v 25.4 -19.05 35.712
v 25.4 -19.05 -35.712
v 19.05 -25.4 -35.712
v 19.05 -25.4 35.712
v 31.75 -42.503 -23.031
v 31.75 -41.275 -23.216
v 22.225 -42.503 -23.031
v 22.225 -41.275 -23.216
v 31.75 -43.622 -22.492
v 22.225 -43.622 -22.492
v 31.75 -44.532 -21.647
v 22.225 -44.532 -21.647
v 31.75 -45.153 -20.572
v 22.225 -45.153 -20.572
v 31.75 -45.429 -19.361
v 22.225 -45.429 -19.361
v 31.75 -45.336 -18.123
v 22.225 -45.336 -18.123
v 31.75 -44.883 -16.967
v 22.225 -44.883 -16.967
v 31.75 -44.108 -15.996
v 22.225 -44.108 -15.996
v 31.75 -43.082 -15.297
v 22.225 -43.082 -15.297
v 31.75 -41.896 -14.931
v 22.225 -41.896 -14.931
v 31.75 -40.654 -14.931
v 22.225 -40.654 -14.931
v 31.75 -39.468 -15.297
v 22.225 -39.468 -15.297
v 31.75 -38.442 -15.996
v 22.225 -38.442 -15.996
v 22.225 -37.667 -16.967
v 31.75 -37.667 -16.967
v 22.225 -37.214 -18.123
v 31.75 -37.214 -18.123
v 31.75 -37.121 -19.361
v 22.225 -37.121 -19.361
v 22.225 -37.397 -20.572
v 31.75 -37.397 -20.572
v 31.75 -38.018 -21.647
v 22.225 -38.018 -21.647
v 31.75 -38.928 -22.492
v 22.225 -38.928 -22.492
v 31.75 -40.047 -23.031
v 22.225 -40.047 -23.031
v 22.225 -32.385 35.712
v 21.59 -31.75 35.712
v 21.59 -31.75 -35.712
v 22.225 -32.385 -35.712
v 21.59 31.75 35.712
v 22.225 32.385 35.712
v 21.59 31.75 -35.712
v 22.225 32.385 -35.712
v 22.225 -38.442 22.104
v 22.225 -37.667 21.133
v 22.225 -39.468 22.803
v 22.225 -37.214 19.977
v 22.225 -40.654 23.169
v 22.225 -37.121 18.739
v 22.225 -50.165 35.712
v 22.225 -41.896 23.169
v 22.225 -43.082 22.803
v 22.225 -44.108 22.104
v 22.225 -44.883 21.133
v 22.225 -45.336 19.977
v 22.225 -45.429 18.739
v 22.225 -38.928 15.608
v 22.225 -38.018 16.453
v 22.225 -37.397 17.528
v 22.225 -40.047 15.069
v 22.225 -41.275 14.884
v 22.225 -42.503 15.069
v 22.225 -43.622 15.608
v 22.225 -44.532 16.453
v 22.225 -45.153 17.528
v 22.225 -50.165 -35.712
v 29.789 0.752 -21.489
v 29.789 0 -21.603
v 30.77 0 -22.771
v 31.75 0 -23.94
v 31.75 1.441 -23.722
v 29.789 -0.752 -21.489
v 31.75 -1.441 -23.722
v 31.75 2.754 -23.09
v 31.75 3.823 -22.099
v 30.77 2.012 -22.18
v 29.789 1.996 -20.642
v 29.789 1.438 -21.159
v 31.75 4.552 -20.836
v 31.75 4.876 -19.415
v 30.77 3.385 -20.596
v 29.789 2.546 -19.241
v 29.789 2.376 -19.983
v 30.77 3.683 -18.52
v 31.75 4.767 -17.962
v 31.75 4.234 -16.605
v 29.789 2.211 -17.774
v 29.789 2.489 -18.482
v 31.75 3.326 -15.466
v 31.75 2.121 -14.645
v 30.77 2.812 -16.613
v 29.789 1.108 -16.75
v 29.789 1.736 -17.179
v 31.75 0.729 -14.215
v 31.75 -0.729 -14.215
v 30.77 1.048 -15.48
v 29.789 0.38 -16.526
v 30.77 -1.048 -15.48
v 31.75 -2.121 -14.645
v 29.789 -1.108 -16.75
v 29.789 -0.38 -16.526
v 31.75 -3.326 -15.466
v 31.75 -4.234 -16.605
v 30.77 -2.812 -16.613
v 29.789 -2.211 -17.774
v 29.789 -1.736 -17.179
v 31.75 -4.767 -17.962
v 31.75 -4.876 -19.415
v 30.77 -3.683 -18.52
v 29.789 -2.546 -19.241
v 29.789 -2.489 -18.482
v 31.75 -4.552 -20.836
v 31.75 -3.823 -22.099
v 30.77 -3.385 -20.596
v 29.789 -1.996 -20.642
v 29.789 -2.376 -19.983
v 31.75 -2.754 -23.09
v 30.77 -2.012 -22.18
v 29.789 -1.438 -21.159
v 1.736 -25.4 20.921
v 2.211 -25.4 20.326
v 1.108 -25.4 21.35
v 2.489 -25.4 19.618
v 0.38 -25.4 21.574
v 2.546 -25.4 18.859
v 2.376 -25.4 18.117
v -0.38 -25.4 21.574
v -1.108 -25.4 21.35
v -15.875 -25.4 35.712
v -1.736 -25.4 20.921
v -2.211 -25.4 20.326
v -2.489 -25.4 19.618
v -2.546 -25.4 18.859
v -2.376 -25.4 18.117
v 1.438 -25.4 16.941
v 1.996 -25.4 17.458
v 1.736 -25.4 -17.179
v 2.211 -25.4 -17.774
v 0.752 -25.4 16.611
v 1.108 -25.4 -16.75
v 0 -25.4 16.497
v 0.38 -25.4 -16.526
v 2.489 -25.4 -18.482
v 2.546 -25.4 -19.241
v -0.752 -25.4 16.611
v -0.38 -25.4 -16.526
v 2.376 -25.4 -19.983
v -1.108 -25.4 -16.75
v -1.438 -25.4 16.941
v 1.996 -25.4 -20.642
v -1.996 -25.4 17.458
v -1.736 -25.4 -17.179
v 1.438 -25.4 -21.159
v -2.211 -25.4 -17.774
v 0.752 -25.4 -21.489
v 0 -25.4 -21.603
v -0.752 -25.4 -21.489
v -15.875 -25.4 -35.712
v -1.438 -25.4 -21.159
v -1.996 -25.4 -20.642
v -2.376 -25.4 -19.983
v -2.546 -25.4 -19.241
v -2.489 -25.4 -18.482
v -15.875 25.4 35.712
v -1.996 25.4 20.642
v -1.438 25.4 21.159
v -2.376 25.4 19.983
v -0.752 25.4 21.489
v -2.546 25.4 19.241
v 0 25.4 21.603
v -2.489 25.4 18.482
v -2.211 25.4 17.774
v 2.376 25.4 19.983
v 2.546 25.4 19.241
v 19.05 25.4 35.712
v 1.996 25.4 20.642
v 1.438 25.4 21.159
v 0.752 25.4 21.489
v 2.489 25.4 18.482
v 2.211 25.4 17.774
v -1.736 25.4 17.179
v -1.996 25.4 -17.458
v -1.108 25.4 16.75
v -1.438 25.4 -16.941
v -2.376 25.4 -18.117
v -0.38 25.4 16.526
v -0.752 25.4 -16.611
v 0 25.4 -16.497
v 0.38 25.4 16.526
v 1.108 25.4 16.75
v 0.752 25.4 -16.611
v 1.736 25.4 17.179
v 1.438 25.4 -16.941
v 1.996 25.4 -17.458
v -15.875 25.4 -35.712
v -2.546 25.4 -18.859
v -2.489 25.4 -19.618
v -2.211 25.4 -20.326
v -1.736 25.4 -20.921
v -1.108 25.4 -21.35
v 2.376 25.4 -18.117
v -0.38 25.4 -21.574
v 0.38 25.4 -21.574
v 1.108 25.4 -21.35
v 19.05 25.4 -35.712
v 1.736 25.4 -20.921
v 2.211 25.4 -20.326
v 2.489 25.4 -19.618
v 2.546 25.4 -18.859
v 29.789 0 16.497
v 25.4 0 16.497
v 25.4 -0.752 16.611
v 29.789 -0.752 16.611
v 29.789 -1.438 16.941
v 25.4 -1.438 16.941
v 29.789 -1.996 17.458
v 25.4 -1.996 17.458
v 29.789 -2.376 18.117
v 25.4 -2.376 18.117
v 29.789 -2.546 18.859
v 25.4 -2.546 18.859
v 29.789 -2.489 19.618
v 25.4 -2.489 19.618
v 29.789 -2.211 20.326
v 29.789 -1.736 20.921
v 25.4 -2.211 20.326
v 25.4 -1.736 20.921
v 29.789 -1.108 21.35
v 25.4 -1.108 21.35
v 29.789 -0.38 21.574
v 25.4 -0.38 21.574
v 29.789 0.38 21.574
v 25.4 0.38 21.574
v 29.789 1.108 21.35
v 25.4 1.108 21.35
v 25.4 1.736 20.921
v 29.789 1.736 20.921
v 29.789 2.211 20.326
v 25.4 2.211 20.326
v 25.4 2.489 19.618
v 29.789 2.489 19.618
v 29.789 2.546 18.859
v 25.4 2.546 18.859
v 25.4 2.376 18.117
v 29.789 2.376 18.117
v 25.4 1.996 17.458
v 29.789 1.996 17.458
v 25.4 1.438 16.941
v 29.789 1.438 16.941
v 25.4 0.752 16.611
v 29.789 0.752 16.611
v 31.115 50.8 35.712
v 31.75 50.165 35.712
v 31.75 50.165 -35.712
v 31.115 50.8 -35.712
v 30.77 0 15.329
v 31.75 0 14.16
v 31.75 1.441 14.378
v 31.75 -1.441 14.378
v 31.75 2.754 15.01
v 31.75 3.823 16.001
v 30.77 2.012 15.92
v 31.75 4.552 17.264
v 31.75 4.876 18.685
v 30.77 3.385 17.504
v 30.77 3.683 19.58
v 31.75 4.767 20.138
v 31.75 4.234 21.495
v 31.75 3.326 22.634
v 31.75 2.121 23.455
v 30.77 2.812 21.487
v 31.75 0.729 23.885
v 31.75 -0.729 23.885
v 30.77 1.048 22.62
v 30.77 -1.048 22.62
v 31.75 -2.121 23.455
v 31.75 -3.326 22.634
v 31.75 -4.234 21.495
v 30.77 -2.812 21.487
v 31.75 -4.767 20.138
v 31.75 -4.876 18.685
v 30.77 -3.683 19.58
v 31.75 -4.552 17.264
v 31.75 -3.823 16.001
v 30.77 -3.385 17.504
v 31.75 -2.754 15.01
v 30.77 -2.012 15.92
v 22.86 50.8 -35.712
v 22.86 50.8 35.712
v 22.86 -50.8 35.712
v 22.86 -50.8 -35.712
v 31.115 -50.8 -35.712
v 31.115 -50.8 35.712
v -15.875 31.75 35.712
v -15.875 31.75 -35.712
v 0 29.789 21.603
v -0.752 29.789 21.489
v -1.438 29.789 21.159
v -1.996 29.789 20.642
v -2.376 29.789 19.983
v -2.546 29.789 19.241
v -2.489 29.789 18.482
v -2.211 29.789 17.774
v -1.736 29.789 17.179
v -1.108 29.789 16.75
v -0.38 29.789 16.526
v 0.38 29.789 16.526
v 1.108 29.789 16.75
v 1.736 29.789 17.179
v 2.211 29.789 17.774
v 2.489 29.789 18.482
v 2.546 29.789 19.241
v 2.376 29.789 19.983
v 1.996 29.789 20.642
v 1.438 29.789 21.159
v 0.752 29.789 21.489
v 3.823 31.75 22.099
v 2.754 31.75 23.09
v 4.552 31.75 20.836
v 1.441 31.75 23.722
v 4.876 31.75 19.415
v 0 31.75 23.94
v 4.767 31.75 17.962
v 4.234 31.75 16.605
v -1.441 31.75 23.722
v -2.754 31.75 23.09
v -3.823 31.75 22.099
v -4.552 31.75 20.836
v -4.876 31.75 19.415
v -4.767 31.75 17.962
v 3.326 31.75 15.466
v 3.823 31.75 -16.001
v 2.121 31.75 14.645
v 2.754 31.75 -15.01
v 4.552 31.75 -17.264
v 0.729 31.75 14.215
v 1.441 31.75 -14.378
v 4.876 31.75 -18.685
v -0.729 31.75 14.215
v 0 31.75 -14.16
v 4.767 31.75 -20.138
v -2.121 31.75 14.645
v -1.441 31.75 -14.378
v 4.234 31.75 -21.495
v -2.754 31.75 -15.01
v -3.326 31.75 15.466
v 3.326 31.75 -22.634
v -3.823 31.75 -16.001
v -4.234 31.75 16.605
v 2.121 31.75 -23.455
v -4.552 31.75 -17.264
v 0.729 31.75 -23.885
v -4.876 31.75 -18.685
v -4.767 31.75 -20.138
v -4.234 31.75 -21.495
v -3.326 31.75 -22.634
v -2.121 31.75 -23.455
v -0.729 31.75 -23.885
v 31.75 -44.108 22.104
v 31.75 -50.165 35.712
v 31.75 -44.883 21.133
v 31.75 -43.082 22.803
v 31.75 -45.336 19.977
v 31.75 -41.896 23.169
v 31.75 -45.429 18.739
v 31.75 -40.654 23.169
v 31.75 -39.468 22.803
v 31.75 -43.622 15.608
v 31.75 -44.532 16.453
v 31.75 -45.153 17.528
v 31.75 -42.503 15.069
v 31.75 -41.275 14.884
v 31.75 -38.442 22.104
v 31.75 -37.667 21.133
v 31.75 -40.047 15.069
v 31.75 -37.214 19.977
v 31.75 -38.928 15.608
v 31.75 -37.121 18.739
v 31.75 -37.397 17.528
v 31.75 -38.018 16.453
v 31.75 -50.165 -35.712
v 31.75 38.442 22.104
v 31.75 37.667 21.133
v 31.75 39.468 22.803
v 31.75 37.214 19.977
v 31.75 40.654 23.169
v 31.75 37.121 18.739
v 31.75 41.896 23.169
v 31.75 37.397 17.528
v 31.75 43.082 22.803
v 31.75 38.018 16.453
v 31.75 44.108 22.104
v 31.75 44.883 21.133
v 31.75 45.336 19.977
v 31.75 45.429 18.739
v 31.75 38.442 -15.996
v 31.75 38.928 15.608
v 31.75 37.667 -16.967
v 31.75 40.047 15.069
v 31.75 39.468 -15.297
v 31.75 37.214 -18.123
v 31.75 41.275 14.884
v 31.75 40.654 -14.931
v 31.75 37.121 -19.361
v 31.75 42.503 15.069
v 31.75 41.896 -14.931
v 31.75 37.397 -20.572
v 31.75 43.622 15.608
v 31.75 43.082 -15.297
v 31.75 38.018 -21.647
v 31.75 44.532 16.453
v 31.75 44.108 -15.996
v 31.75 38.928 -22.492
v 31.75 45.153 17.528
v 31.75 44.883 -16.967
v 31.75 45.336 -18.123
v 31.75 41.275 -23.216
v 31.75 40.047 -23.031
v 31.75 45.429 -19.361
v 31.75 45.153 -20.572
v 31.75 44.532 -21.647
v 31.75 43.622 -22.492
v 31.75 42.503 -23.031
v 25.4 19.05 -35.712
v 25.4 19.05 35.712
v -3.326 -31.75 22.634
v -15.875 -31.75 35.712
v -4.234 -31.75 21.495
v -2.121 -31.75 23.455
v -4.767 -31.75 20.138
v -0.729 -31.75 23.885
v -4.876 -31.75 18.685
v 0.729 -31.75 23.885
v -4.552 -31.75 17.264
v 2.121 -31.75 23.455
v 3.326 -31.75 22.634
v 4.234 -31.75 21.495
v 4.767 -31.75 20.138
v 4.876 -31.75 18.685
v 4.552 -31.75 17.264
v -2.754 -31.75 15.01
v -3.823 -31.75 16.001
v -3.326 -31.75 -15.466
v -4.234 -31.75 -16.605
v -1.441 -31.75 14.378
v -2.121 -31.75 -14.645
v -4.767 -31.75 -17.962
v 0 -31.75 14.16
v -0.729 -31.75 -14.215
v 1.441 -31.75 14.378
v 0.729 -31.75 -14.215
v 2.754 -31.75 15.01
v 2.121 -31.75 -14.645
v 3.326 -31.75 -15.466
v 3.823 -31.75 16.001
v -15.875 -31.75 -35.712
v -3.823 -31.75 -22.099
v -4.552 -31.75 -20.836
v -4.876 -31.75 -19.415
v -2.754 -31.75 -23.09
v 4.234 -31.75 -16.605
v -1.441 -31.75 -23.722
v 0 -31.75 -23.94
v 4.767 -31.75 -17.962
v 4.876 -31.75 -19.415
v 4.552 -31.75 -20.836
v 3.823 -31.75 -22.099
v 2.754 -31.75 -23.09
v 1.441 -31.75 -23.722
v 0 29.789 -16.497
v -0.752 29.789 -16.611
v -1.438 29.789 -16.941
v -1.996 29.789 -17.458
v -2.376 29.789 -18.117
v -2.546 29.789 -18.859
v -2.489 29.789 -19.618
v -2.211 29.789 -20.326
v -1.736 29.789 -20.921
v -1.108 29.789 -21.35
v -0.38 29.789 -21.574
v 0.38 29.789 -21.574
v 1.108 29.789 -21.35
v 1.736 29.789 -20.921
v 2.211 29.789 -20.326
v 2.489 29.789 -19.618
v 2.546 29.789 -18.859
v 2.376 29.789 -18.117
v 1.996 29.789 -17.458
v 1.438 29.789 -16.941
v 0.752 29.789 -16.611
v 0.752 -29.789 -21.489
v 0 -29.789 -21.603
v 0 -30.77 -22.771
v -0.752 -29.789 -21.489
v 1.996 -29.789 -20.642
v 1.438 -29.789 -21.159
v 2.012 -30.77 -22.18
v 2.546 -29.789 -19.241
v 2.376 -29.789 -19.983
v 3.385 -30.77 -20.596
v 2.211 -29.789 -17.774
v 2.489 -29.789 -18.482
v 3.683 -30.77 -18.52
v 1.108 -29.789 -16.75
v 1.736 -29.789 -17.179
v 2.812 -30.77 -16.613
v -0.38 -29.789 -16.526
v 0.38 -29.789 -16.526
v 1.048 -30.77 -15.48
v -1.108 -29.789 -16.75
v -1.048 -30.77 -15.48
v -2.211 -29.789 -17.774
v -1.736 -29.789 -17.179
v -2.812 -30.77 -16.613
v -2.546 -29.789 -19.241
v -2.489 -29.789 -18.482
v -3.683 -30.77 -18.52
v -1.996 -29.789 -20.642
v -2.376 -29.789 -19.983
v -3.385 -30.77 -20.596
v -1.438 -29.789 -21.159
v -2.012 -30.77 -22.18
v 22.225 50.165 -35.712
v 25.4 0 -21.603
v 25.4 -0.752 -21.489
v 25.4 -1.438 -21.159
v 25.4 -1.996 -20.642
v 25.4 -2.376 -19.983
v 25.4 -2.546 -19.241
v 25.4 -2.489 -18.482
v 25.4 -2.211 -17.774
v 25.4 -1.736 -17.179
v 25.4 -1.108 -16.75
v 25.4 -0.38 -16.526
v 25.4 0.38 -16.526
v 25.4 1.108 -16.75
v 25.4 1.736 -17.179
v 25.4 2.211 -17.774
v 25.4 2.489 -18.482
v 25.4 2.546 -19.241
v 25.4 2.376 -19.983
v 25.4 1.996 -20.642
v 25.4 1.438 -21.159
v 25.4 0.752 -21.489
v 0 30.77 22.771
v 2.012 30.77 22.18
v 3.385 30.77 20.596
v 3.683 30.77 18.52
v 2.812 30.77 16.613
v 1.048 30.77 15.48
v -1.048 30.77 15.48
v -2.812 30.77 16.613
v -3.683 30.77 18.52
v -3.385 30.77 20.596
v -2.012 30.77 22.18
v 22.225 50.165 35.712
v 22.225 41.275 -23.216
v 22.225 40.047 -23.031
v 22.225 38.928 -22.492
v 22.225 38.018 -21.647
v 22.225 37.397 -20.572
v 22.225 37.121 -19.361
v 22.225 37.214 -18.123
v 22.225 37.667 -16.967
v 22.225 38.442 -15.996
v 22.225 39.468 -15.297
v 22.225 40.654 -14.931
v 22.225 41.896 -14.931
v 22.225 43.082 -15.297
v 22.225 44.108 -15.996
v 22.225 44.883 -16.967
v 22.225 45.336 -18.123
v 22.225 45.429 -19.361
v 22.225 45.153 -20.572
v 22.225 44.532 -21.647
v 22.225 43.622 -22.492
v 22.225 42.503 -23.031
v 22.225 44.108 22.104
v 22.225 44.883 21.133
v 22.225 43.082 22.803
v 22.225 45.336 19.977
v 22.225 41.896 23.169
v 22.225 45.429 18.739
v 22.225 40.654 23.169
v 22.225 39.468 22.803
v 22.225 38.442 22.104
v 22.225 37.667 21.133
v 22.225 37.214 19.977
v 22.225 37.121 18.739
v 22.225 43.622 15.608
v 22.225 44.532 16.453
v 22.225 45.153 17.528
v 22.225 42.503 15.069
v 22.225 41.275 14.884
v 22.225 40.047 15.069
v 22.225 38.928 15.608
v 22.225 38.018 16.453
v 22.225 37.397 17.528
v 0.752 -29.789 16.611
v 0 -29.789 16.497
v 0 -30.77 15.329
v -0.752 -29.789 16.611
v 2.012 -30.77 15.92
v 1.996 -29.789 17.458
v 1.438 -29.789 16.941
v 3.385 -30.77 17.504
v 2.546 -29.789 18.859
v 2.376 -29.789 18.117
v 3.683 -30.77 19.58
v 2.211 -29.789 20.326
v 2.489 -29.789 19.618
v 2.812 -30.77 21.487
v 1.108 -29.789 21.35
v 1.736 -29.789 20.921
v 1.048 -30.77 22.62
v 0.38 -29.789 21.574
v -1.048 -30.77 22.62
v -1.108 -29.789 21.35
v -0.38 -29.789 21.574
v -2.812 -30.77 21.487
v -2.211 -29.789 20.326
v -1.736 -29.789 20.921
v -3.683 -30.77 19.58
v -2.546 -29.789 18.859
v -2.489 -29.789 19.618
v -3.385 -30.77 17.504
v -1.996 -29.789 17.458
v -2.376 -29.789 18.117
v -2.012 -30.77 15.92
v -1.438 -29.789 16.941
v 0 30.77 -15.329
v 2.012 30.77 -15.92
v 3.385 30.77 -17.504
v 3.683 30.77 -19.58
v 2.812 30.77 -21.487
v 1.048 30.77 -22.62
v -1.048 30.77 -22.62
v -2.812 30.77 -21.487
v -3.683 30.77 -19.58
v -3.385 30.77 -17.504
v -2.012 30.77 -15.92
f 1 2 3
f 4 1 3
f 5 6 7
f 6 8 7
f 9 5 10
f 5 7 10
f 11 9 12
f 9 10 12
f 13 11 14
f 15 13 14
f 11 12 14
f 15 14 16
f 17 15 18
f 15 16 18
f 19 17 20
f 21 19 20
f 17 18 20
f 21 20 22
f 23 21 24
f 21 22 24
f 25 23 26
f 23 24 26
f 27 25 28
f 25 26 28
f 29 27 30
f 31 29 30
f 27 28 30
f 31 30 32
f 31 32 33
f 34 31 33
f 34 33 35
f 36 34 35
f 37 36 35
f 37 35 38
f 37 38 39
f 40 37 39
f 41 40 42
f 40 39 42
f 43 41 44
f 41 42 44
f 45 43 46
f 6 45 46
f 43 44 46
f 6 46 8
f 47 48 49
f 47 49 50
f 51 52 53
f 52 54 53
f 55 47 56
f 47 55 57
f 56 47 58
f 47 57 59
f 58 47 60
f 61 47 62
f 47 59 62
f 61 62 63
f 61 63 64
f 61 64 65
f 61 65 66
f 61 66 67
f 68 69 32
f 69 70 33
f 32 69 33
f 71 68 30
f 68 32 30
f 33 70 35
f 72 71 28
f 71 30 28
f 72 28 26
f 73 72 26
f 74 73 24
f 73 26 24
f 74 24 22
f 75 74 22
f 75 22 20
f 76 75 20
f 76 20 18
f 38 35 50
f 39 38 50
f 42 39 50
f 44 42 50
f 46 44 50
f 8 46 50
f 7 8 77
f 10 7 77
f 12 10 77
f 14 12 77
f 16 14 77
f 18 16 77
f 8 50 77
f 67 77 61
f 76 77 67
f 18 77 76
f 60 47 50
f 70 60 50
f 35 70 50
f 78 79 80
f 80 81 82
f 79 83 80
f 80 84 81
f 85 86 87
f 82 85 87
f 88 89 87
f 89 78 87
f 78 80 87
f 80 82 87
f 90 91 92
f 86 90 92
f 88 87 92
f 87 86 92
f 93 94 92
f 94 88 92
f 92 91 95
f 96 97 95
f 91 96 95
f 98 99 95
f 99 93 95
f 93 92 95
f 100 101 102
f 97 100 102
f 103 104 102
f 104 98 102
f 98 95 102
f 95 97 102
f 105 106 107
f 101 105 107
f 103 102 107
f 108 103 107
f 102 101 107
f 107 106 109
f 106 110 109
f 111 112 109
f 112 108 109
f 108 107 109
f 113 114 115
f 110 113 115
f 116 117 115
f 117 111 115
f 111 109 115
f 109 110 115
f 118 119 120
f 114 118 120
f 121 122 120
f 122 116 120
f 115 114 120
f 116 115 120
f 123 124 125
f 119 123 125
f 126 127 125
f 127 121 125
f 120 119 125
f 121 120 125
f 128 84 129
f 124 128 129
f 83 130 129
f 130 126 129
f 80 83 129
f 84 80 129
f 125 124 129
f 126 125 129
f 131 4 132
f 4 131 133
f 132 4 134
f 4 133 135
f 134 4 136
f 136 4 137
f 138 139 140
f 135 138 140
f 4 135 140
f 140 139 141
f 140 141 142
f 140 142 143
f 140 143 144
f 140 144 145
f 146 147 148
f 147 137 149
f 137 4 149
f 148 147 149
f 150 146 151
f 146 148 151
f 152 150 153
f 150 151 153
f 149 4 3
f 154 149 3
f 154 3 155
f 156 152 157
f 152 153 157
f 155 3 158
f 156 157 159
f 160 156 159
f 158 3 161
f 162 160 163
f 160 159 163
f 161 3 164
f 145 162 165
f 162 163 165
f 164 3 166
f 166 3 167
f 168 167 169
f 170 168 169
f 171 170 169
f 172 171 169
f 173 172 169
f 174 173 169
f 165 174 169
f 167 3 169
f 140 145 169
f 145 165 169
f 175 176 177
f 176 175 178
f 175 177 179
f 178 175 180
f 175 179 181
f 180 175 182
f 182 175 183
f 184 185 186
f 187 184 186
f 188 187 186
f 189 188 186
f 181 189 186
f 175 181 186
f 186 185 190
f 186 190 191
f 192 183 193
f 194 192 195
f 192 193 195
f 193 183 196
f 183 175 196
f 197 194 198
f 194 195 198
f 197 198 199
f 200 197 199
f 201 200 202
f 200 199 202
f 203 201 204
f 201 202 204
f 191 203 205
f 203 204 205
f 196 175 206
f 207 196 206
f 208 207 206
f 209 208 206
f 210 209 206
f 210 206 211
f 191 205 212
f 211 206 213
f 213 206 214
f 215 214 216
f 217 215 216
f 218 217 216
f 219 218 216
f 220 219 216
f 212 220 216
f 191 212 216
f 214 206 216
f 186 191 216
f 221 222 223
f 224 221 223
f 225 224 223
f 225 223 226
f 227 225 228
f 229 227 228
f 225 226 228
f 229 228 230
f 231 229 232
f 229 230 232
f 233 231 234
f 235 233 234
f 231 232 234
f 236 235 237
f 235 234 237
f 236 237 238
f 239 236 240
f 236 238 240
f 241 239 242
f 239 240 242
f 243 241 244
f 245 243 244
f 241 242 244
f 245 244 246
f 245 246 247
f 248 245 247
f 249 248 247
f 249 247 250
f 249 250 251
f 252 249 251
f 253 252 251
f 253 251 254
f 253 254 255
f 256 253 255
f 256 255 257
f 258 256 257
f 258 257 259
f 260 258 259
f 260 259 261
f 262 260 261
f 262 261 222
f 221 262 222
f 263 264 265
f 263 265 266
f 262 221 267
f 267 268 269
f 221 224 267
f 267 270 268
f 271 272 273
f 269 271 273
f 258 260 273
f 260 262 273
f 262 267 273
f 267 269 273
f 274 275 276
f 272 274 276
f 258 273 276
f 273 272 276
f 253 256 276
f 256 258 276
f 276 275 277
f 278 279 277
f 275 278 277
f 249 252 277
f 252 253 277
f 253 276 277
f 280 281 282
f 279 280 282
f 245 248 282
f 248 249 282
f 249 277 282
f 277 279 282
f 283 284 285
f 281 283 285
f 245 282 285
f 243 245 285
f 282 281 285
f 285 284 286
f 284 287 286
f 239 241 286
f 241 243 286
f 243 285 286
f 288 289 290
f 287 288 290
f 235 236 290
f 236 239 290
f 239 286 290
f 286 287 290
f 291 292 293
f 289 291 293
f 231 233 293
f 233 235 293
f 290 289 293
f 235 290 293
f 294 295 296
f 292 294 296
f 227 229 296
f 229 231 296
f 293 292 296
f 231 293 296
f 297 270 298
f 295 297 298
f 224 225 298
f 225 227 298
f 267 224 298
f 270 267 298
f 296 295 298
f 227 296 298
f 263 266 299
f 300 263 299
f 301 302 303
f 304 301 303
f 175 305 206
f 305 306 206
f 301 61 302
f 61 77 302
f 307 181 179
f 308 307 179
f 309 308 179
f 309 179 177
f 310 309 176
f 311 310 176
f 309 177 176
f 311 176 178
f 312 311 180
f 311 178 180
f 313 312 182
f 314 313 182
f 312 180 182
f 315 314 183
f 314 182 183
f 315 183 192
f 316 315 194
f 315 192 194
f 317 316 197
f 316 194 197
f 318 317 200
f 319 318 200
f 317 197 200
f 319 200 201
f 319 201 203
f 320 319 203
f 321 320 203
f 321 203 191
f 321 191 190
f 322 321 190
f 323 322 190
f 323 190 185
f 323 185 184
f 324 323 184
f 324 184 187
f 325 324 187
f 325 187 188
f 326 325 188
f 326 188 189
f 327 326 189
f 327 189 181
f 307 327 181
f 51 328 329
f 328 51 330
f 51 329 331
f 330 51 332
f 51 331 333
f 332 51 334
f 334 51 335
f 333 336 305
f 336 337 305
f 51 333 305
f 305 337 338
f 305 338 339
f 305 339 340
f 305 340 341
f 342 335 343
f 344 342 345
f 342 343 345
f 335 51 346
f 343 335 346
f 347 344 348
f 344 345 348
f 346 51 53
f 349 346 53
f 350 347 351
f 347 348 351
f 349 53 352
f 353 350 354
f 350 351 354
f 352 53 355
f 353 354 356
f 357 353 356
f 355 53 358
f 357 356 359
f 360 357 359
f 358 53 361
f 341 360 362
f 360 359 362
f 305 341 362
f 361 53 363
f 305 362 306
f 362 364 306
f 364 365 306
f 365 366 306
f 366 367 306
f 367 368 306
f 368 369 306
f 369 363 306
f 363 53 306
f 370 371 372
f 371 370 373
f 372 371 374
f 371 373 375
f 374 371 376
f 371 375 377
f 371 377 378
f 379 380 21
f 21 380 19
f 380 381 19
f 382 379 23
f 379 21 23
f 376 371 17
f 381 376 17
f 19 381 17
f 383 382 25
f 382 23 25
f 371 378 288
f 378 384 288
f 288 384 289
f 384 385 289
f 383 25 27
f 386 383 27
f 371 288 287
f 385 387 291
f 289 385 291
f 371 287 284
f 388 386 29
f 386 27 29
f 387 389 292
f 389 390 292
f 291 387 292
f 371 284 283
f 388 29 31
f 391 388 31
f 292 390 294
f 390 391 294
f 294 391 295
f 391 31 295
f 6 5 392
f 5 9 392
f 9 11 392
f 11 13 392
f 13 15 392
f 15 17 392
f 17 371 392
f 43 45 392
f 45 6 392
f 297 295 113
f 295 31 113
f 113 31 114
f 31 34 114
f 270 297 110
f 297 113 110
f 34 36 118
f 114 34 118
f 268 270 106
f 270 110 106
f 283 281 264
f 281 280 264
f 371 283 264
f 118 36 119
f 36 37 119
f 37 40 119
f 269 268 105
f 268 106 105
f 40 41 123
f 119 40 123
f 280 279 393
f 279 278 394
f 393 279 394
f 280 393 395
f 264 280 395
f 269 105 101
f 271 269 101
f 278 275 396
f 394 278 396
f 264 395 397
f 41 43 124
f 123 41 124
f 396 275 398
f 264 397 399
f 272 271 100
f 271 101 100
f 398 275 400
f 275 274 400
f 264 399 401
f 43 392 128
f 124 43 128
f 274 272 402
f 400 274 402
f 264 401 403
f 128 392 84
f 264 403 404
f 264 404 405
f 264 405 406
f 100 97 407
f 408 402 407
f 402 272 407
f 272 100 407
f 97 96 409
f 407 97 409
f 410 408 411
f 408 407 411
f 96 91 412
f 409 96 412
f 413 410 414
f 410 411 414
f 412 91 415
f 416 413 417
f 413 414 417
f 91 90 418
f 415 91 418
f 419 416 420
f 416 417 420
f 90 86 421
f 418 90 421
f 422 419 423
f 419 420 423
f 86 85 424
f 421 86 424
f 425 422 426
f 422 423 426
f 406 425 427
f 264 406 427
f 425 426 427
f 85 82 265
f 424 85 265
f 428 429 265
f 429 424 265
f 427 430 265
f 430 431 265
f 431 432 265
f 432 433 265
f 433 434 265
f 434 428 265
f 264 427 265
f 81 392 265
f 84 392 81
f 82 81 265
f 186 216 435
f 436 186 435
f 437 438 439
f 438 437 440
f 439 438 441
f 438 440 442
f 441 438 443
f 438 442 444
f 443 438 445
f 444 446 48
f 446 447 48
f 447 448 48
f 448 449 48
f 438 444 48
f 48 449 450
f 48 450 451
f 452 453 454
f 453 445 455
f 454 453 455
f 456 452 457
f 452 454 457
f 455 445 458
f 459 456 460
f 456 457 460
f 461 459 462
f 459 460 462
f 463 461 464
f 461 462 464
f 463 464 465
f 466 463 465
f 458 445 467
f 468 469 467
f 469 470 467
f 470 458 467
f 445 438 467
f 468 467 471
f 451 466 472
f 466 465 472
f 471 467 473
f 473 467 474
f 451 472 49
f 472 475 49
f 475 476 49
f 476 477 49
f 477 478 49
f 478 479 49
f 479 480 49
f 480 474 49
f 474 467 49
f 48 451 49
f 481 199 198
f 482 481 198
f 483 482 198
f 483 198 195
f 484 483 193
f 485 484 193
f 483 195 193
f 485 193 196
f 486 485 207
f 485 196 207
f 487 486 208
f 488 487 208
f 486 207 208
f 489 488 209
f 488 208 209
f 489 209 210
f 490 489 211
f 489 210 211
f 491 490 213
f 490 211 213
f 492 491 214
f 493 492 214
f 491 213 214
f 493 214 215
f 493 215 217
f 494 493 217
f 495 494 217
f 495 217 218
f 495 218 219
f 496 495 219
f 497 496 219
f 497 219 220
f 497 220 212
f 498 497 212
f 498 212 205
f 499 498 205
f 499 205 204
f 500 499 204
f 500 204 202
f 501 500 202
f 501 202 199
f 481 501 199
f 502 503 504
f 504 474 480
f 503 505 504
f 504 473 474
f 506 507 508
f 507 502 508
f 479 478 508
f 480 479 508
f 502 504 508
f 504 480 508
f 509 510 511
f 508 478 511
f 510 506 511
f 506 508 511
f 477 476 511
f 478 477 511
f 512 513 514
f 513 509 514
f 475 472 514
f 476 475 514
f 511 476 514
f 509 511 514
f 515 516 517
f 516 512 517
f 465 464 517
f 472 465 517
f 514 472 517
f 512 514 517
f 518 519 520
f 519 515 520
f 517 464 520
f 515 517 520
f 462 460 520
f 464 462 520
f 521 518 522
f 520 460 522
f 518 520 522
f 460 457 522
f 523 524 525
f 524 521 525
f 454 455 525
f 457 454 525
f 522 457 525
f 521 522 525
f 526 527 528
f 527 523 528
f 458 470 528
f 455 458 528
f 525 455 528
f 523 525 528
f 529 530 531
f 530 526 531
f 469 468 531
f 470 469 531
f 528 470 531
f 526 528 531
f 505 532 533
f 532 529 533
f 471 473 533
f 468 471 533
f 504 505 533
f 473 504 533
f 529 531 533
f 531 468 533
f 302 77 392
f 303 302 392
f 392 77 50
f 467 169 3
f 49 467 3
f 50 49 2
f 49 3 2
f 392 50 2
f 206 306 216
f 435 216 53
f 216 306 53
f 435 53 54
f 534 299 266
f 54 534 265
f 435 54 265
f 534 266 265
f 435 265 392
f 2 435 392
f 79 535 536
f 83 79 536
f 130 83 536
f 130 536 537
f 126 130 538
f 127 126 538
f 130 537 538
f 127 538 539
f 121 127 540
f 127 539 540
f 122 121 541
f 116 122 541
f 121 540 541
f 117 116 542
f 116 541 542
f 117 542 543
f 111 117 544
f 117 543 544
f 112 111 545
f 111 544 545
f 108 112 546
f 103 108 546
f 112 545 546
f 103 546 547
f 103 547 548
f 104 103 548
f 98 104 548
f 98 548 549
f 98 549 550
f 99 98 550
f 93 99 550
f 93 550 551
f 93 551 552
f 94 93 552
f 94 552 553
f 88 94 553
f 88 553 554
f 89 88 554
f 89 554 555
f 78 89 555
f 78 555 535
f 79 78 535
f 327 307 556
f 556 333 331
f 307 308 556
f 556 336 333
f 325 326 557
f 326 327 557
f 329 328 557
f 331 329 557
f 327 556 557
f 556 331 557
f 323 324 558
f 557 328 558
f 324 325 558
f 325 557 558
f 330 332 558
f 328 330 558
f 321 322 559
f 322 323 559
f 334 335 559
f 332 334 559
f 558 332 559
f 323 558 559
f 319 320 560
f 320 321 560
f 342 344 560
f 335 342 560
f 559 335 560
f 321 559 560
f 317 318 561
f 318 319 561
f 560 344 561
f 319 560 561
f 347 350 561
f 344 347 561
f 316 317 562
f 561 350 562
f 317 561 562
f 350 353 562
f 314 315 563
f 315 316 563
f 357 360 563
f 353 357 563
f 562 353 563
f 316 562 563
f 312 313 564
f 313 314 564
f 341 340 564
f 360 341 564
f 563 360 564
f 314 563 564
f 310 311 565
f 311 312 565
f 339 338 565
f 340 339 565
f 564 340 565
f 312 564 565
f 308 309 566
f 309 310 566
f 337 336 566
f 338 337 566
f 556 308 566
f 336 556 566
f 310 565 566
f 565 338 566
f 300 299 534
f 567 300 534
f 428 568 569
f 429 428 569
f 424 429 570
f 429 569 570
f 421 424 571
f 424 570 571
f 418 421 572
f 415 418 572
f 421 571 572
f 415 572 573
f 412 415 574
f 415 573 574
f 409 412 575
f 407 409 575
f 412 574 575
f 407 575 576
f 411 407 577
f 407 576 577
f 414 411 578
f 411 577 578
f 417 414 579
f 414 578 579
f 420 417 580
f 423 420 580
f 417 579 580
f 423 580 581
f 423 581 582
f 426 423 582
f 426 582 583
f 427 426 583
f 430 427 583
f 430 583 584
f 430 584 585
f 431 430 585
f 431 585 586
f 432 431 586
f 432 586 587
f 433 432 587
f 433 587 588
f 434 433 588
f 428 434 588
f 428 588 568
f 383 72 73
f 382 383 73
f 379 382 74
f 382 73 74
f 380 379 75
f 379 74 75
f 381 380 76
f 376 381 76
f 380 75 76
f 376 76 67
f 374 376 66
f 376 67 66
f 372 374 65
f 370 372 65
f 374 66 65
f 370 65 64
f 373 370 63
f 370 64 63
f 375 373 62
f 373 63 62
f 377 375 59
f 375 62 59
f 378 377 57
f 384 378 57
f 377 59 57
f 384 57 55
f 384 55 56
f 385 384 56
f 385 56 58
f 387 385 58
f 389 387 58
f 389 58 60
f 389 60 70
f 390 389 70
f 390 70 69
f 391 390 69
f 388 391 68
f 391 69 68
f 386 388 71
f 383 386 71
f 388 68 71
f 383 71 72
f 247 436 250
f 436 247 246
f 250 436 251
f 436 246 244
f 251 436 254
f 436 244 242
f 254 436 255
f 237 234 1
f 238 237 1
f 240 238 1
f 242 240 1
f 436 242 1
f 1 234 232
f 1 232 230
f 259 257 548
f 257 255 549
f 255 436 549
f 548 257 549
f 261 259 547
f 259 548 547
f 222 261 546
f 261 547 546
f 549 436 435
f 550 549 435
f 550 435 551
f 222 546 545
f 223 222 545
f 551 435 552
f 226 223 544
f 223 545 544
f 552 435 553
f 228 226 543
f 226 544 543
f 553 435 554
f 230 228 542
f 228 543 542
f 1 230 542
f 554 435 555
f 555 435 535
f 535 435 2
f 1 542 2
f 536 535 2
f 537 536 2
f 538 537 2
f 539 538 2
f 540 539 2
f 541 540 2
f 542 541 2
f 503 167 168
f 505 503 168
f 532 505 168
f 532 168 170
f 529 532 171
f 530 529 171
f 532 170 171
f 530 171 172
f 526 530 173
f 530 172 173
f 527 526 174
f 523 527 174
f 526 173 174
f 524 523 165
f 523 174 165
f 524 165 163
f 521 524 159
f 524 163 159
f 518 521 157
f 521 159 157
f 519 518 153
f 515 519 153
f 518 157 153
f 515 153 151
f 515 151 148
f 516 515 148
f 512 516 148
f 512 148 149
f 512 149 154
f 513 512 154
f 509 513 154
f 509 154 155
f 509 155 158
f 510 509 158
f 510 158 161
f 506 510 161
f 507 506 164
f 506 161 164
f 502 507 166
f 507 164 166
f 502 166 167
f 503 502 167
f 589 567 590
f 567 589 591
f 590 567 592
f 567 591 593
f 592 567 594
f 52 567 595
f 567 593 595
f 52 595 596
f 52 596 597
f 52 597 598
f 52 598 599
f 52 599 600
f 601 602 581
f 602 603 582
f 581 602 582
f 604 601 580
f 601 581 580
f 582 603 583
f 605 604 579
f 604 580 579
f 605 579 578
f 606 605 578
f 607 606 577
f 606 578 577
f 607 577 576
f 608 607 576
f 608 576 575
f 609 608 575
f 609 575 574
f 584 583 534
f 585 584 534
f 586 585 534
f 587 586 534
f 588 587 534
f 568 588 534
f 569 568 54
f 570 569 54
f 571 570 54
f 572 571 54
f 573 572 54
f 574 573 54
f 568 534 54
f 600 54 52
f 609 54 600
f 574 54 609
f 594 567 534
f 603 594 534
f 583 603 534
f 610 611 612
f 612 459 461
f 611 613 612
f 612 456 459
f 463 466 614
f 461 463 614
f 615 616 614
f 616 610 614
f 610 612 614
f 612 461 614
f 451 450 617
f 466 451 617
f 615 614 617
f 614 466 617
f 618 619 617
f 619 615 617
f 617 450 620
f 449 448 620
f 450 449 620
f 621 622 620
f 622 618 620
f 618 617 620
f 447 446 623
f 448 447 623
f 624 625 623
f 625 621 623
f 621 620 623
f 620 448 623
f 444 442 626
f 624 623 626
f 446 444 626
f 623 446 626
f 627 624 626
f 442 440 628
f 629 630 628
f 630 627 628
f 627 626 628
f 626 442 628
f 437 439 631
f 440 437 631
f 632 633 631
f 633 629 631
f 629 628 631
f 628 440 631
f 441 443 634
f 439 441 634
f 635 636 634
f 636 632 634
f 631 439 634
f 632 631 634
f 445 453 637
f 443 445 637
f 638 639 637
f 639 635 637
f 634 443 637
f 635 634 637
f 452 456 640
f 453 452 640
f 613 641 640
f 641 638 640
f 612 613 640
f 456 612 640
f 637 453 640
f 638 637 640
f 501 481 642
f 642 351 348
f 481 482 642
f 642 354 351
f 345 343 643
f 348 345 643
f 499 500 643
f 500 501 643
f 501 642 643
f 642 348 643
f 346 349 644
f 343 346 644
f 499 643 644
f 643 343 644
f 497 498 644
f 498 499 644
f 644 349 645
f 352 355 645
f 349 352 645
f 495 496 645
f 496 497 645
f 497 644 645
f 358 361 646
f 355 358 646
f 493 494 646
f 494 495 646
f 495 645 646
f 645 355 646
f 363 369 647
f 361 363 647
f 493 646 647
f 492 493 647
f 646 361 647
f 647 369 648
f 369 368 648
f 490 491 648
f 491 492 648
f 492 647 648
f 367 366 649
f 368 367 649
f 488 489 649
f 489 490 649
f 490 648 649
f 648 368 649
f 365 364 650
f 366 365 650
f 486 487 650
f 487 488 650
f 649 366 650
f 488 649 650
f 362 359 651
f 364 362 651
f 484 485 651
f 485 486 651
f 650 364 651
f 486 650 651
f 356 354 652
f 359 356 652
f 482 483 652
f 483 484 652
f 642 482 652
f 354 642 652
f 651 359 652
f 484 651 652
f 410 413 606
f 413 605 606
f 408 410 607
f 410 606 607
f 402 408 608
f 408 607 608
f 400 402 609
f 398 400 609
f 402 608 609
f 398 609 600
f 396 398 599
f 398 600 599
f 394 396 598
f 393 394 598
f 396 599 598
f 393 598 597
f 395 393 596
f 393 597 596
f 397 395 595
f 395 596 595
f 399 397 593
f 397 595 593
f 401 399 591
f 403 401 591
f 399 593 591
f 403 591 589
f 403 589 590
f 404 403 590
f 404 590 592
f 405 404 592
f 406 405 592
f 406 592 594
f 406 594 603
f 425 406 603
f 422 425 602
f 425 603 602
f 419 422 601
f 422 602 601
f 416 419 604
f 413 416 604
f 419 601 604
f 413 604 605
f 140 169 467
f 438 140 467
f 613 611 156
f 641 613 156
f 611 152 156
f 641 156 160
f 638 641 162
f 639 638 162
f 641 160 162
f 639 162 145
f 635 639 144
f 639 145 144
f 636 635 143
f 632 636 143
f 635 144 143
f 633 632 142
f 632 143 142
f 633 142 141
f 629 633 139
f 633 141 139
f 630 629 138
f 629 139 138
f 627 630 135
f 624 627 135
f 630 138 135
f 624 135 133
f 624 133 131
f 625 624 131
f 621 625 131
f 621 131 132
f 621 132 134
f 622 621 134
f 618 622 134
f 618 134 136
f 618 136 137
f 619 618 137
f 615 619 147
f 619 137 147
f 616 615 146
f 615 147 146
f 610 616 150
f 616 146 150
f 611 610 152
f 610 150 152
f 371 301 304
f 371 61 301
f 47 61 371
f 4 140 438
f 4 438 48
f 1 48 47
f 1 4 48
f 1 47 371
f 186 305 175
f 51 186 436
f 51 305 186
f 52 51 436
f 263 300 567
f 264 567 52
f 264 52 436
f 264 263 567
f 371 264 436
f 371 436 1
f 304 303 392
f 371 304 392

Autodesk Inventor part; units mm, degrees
sketch "Sketch_1" plane through (0, 0, 0) normal (0, 0, 1) x (1, 0, 0)
  line L0 (-15.875, -25.4) -> (-15.875, -31.75)
  line L1 (-15.875, -31.75) -> (21.59, -31.75)
  line L2 (21.59, -31.75) -> (22.225, -32.385)
  line L3 (22.225, -32.385) -> (22.225, -50.165)
  line L4 (22.225, -50.165) -> (22.86, -50.8)
  line L5 (22.86, -50.8) -> (31.115, -50.8)
  line L6 (31.115, -50.8) -> (31.75, -50.165)
  line L7 (31.75, -50.165) -> (31.75, 50.165)
  line L8 (31.75, 50.165) -> (31.115, 50.8)
  line L9 (31.115, 50.8) -> (22.86, 50.8)
  line L10 (22.86, 50.8) -> (22.225, 50.165)
  line L11 (22.225, 50.165) -> (22.225, 32.385)
  line L12 (22.225, 32.385) -> (21.59, 31.75)
  line L13 (21.59, 31.75) -> (-15.875, 31.75)
  line L14 (-15.875, 31.75) -> (-15.875, 25.4)
  line L15 (-15.875, 25.4) -> (19.05, 25.4)
  line L16 (19.05, 25.4) -> (25.4, 19.05)
  line L17 (25.4, 19.05) -> (25.4, -19.05)
  line L18 (25.4, -19.05) -> (19.05, -25.4)
  line L19 (19.05, -25.4) -> (-15.875, -25.4)
extrude "Extrusion1" add sketch "Sketch_1" along normal mid plane 71.4248
sketch "Sketch2" plane through (31.75, -50.165, 35.7124) normal (1, 0, 0) x (0, 0, -1)
  point P0 (16.6624, 91.44)
hole "Hole1" at (31.75, 41.275, 19.05) direction (-1, 0, 0) diameter 8.3312 depth 9.525
pattern_linear "Rectangular Pattern1" count 2 spacing 38.1 along (0, 0, -1) count 2 spacing 82.55 along (0, -1, 0) of "Hole1"
sketch "Sketch3" plane through (31.75, -50.165, 35.7124) normal (1, 0, 0) x (0, 0, -1)
  point P0 (16.6624, 50.165)
hole "Hole2" at (31.75, 0, 19.05) direction (-1, 0, 0) diameter 5.1054 depth 6.35 countersink diameter 9.779 countersink angle 100
pattern_linear "Rectangular Pattern2" count 2 spacing 38.1 along (0, 0, -1) of "Hole2"
sketch "Sketch4" plane through (-15.875, 31.75, 35.7124) normal (0, 1, 0) x (1, 0, 0)
  point P0 (15.875, 16.6624)
hole "Hole3" at (0, 31.75, 19.05) direction (0, -1, 0) diameter 5.1054 depth 6.35 countersink diameter 9.779 countersink angle 100
pattern_linear "Rectangular Pattern3" count 2 spacing 38.1 along (0, 0, -1) of "Hole3"
sketch "Sketch5" plane through (-15.875, -31.75, 35.7124) normal (0, -1, 0) x (1, 0, 0)
  point P0 (15.875, -16.6624)
hole "Hole4" at (0, -31.75, 19.05) direction (0, 1, 0) diameter 5.1054 depth 6.35 countersink diameter 9.779 countersink angle 100
pattern_linear "Rectangular Pattern4" count 2 spacing 38.1 along (0, 0, -1) of "Hole4"
ref_plane "s1_XY" through (25.4, 0, 19.05) normal (1, 0, 0) x (0, 0, -1)
ref_plane "s1_YZ" through (25.4, 0, 19.05) normal (0, 0, -1) x (0, 1, 0)
ref_plane "s1_ZX" through (25.4, 0, 19.05) normal (0, 1, 0) x (1, 0, 0)
ref_plane "s1_2_XY" through (25.4, 0, -19.05) normal (1, 0, 0) x (0, 0, -1)
ref_plane "s1_2_YZ" through (25.4, 0, -19.05) normal (0, 0, -1) x (0, 1, 0)
ref_plane "s1_2_ZX" through (25.4, 0, -19.05) normal (0, 1, 0) x (1, 0, 0)
ref_plane "s2_XY" through (0, 25.4, 19.05) normal (0, 1, 0) x (1, 0, 0)
ref_plane "s2_YZ" through (0, 25.4, 19.05) normal (1, 0, 0) x (0, 0, -1)
ref_plane "s2_ZX" through (0, 25.4, 19.05) normal (0, 0, -1) x (0, 1, 0)
ref_plane "s2_2_XY" through (0, 25.4, -19.05) normal (0, 1, 0) x (1, 0, 0)
ref_plane "s2_2_YZ" through (0, 25.4, -19.05) normal (1, 0, 0) x (0, 0, -1)
ref_plane "s2_2_ZX" through (0, 25.4, -19.05) normal (0, 0, -1) x (0, 1, 0)
ref_plane "s3_XY" through (0, -25.4, 19.05) normal (0, 1, 0) x (1, 0, 0)
ref_plane "s3_YZ" through (0, -25.4, 19.05) normal (1, 0, 0) x (0, 0, -1)
ref_plane "s3_ZX" through (0, -25.4, 19.05) normal (0, 0, -1) x (0, 1, 0)
ref_plane "s3_2_XY" through (0, -25.4, -19.05) normal (0, 1, 0) x (1, 0, 0)
ref_plane "s3_2_YZ" through (0, -25.4, -19.05) normal (1, 0, 0) x (0, 0, -1)
ref_plane "s3_2_ZX" through (0, -25.4, -19.05) normal (0, 0, -1) x (0, 1, 0)
ref_plane "t1_1_XY" through (29.7892, 0, 19.05) normal (1, 0, 0) x (0, 0, -1)
ref_plane "t1_1_YZ" through (29.7892, 0, 19.05) normal (0, 0, -1) x (0, 1, 0)
ref_plane "t1_1_ZX" through (29.7892, 0, 19.05) normal (0, 1, 0) x (1, 0, 0)
ref_plane "t1_2_XY" through (29.7892, 0, -19.05) normal (1, 0, 0) x (0, 0, -1)
ref_plane "t1_2_YZ" through (29.7892, 0, -19.05) normal (0, 0, -1) x (0, 1, 0)
ref_plane "t1_2_ZX" through (29.7892, 0, -19.05) normal (0, 1, 0) x (1, 0, 0)
ref_plane "t2_1_XY" through (0, 29.7892, 19.05) normal (0, 1, 0) x (1, 0, 0)
ref_plane "t2_1_YZ" through (0, 29.7892, 19.05) normal (1, 0, 0) x (0, 0, -1)
ref_plane "t2_1_ZX" through (0, 29.7892, 19.05) normal (0, 0, -1) x (0, 1, 0)
ref_plane "t2_2_XY" through (0, 29.7892, -19.05) normal (0, 1, 0) x (1, 0, 0)
ref_plane "t2_2_YZ" through (0, 29.7892, -19.05) normal (1, 0, 0) x (0, 0, -1)
ref_plane "t2_2_ZX" through (0, 29.7892, -19.05) normal (0, 0, -1) x (0, 1, 0)
ref_plane "t3_1_XY" through (0, -29.7892, 19.05) normal (0, 1, 0) x (1, 0, 0)
ref_plane "t3_1_YZ" through (0, -29.7892, 19.05) normal (1, 0, 0) x (0, 0, -1)
ref_plane "t3_1_ZX" through (0, -29.7892, 19.05) normal (0, 0, -1) x (0, 1, 0)
ref_plane "t3_2_XY" through (0, -29.7892, -19.05) normal (0, 1, 0) x (1, 0, 0)
ref_plane "t3_2_YZ" through (0, -29.7892, -19.05) normal (1, 0, 0) x (0, 0, -1)
ref_plane "t3_2_ZX" through (0, -29.7892, -19.05) normal (0, 0, -1) x (0, 1, 0)
properties part number "6825_p"
